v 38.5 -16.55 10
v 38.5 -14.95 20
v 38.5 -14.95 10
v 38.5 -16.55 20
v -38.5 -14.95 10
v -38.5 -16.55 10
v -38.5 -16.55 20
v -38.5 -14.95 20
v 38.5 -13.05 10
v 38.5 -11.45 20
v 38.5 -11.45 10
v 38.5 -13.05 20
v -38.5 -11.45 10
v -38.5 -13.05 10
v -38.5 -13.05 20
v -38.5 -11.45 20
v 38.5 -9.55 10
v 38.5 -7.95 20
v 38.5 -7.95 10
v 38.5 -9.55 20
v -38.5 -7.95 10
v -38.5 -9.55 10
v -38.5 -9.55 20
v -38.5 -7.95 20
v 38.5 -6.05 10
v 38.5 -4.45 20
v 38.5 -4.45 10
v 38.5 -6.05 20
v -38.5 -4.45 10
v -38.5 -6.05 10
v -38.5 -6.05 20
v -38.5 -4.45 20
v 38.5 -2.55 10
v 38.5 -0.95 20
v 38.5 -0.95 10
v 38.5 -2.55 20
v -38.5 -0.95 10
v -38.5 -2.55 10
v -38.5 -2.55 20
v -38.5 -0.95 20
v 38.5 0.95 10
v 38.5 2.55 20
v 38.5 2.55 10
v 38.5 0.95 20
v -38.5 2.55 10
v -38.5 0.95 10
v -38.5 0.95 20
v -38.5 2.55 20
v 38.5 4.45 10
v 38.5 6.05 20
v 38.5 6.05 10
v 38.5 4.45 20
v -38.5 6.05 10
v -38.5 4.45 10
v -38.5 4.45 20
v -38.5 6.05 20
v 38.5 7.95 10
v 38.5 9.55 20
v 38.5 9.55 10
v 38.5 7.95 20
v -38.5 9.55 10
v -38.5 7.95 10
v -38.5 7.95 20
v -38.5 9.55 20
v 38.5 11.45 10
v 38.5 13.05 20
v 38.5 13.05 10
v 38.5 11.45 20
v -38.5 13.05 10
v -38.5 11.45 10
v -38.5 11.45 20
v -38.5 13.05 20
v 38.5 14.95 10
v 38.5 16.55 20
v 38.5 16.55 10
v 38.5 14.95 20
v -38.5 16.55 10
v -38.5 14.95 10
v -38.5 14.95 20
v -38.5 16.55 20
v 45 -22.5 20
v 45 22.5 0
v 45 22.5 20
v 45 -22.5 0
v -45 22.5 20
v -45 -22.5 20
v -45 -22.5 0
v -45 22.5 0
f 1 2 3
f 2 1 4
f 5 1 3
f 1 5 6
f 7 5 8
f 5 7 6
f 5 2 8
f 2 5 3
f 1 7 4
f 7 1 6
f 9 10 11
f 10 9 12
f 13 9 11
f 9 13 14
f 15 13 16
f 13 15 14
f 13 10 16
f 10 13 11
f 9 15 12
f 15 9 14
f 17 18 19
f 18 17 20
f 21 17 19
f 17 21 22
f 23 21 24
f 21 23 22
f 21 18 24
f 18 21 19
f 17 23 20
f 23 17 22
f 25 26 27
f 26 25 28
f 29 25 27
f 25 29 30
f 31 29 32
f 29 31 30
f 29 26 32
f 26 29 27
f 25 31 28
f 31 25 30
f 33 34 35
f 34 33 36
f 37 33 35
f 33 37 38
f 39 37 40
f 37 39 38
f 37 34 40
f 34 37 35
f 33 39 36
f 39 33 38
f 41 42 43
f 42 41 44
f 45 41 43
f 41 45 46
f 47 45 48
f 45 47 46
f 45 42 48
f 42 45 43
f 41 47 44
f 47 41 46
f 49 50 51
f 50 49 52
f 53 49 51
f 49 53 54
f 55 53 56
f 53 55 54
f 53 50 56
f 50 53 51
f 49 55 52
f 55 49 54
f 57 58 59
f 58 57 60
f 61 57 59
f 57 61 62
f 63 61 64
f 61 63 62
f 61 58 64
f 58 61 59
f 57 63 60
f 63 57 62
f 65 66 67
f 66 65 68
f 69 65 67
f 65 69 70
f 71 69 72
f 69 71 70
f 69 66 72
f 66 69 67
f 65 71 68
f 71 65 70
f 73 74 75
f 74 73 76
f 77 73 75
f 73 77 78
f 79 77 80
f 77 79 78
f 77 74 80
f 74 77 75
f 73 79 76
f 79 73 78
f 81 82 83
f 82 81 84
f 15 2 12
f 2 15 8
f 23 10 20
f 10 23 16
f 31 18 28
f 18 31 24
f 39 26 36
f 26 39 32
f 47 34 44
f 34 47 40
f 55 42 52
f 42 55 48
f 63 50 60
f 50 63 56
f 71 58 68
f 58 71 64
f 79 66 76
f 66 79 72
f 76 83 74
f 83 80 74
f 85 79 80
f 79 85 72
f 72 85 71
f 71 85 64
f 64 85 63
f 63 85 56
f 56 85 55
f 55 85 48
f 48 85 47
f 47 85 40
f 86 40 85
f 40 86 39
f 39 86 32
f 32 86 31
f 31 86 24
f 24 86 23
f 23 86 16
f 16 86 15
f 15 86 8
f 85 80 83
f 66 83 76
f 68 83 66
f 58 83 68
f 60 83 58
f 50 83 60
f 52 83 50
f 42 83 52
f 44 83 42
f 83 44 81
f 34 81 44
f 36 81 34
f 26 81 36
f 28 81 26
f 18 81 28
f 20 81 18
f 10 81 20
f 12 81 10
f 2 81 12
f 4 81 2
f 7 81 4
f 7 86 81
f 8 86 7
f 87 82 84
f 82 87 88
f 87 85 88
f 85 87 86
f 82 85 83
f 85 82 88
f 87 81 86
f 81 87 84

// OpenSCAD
// Slide drying rack - holds 10 microscope slides standing upright on their long edge
// Print orientation: base block on the XY plane, slots open upward (+Z)

// ---------------- Parameters ----------------
block_len    = 90;    // base block length along X (mm)
block_wid    = 45;    // base block width along Y (mm)
block_h      = 20;    // base block height along Z (mm)

slot_count   = 10;    // number of slide slots
slot_len     = 77;    // slot length along X (mm)
slot_w       = 1.6;   // slot width along Y (mm)
slot_depth   = 10;    // slot depth from top face (mm)
slot_pitch   = 3.5;   // centre-to-centre slot spacing along Y (mm)

eps          = 0.5;   // overcut past faces to avoid coplanar surfaces (mm)

$fn = 64;

// ---------------- Model ----------------
difference() {
    // Solid base block, centred in X and Y, resting on z = 0
    translate([-block_len/2, -block_wid/2, 0])
        cube([block_len, block_wid, block_h]);

    // Parallel slots running along X, centred as a group in X and Y
    for (i = [0 : slot_count - 1]) {
        y = (i - (slot_count - 1)/2) * slot_pitch;
        translate([-slot_len/2, y - slot_w/2, block_h - slot_depth])
            cube([slot_len, slot_w, slot_depth + eps]);
    }
}
